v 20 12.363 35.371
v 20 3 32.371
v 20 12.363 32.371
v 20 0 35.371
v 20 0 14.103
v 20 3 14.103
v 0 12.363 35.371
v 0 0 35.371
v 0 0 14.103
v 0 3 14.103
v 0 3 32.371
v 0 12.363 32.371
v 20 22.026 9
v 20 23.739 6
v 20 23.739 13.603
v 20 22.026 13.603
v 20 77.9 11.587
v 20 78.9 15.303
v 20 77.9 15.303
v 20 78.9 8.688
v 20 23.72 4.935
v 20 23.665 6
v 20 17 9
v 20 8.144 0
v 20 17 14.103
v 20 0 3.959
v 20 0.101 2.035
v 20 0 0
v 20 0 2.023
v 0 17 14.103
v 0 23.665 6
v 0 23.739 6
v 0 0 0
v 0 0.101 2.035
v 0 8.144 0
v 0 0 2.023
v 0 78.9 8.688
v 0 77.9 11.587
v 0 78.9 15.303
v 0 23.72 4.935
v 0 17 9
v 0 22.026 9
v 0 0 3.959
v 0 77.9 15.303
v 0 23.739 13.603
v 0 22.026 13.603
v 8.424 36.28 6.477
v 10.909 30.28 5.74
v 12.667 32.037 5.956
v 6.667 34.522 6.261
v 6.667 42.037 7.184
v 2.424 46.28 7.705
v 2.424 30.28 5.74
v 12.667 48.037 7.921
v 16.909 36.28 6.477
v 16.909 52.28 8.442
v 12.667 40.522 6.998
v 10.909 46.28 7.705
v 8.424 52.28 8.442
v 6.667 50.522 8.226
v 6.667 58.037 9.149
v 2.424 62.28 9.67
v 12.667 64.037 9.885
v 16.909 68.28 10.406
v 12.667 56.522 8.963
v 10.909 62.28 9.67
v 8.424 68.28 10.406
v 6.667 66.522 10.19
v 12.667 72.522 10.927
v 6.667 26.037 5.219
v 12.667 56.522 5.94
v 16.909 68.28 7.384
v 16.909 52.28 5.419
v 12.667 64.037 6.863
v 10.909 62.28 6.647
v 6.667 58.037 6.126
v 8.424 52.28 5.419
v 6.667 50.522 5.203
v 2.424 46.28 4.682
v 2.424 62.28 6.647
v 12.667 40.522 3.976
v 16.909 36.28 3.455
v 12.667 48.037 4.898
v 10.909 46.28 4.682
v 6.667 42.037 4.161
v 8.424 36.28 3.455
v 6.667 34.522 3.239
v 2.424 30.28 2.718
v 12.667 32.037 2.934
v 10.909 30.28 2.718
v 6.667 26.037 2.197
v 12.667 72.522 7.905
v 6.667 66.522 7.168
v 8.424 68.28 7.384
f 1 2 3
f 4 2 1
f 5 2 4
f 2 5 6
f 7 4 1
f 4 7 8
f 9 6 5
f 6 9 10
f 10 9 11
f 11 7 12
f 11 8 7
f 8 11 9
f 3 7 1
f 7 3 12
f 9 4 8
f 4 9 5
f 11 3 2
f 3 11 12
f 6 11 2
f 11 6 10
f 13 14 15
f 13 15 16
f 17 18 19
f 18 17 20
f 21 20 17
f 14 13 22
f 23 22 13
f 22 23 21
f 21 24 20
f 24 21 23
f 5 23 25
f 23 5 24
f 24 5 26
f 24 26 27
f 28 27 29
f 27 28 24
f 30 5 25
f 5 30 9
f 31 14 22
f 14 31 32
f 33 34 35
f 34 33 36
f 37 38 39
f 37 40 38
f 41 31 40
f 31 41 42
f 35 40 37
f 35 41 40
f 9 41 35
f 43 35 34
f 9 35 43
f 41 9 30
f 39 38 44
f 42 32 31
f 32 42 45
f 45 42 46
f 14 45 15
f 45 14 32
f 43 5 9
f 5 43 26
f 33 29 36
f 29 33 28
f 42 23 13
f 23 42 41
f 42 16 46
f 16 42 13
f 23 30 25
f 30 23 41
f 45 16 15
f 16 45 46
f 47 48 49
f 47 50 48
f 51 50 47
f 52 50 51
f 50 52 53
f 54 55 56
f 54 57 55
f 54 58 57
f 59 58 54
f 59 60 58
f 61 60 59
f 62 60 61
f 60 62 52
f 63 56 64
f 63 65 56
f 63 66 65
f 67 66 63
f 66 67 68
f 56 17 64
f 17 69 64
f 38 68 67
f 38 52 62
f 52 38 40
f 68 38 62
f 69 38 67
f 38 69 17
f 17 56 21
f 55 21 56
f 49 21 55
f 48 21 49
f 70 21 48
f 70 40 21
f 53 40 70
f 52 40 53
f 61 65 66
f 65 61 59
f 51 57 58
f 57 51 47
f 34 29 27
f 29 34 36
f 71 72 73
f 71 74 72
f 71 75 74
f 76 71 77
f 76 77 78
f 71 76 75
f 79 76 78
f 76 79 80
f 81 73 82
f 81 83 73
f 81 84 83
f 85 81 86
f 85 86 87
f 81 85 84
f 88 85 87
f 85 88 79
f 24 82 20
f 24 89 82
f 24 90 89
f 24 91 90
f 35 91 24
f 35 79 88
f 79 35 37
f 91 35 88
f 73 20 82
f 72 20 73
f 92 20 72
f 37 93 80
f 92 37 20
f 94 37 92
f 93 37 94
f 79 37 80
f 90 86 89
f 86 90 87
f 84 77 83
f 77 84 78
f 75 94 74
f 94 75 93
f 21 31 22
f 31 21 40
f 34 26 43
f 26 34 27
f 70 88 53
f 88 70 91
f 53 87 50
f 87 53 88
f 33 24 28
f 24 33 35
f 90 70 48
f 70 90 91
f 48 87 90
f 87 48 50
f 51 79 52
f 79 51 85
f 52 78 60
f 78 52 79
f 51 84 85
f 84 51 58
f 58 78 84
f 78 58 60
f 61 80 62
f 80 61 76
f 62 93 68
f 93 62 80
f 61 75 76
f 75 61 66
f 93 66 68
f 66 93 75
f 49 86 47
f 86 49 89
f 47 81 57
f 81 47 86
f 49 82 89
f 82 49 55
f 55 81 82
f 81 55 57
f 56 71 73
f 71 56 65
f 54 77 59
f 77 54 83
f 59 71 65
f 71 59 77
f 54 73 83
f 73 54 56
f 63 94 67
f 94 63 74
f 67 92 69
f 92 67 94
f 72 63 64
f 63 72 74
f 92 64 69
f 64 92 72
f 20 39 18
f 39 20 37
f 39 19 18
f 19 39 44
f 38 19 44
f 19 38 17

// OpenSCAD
// In general, width = X axis, depth = Y axis, height = Z axis

// Thickness of the walls that make up the clamps.
clamp_thickness = 3;
// Width of one part.
// TODO measure this.
width = 20;

// This is the big clamp, gripping the back 
// of the laptop. It's the main mechanism
// keeping the attachment in place at the moment.

// Height of the gap in the big back clamp.
back_clamp_height = 18.268;
// Height of the back clamp including walls.
back_clamp_outer_height = back_clamp_height + clamp_thickness;

module big_back_clamp() {
    difference() {
        cube([width, 12.363, back_clamp_outer_height]);
        translate([-1, clamp_thickness, 0]) cube([width+2, 20, back_clamp_height]);
    }
}

// This is the small clamp, gripping the little
// ridge at the bottom of the laptop.

// Dimensions of the ridge on the laptop.
ridge_upper_depth = 5.026;
ridge_lower_depth = 4;

// add 0.6 to compensate for reduced back gap
ridge_height = 4.503 + 0.6;
ridge_y_start = 17;
ridge_clamp_depth = 23.739;
ridge_clamp_height = ridge_height + clamp_thickness;

module small_bottom_ridge_clamp() {
    difference() {
        cube([width, ridge_clamp_depth, ridge_clamp_height]);
        translate([0, ridge_y_start, ridge_clamp_height - ridge_height]) cube([width, ridge_upper_depth, ridge_height]);
        translate([0, ridge_y_start + ridge_upper_depth, ridge_clamp_height - 0.5]) cube([width, 2, 0.5]);
    }
}

mesh_cutout_size = 6;
mesh_cutout_gap = 10;
module mesh_cutouts() {
    for (x=[0:0]) {
        for (y=[0:2]) {
translate([(mesh_cutout_size + mesh_cutout_gap) * x, (mesh_cutout_size + mesh_cutout_gap) * y, 0])         rotate([0, 0, 45]) cube([mesh_cutout_size, mesh_cutout_size, mesh_height]);
        }
    }
    for (x=[0:0]) {
        for (y=[0:2]) {
translate([mesh_cutout_size + (mesh_cutout_size + mesh_cutout_gap) * x, mesh_cutout_size + (mesh_cutout_size + mesh_cutout_gap) * y, 0])         rotate([0, 0, 45]) cube([mesh_cutout_size, mesh_cutout_size, mesh_height]);
        }
    }
}

// Start of the small lip that the front end of the mesh
// wraps around.
lip_depth = 77.9;
lip_clamp_thickness = 1;
lip_height = 1.2;
mesh_depth = lip_depth + lip_clamp_thickness;
mesh_height = 6 + ridge_clamp_height;
mesh_thickness = 3;
module mesh() {
    intersection() { 
        translate([0, 0, -1]) rotate([7, 0, 0]) {
            cube([width, mesh_depth * 3, mesh_thickness]);
            translate([0, 0.4, 2]) rotate([-4, 0, 0]) cube([width, ridge_clamp_depth, 6]);
        }
        difference() {
            cube([width, mesh_depth, mesh_height]);
            translate([width/3, mesh_depth*0.33, 0]) {
                mesh_cutouts();
            }
        }
    };
    translate([0, lip_depth, mesh_height-4]) cube([width, lip_clamp_thickness, 4+lip_height]);
}

translate([0, 0, mesh_height - ridge_clamp_height]) {
    translate([0, 0, ridge_clamp_height]) big_back_clamp();
    small_bottom_ridge_clamp();
}
mesh();
